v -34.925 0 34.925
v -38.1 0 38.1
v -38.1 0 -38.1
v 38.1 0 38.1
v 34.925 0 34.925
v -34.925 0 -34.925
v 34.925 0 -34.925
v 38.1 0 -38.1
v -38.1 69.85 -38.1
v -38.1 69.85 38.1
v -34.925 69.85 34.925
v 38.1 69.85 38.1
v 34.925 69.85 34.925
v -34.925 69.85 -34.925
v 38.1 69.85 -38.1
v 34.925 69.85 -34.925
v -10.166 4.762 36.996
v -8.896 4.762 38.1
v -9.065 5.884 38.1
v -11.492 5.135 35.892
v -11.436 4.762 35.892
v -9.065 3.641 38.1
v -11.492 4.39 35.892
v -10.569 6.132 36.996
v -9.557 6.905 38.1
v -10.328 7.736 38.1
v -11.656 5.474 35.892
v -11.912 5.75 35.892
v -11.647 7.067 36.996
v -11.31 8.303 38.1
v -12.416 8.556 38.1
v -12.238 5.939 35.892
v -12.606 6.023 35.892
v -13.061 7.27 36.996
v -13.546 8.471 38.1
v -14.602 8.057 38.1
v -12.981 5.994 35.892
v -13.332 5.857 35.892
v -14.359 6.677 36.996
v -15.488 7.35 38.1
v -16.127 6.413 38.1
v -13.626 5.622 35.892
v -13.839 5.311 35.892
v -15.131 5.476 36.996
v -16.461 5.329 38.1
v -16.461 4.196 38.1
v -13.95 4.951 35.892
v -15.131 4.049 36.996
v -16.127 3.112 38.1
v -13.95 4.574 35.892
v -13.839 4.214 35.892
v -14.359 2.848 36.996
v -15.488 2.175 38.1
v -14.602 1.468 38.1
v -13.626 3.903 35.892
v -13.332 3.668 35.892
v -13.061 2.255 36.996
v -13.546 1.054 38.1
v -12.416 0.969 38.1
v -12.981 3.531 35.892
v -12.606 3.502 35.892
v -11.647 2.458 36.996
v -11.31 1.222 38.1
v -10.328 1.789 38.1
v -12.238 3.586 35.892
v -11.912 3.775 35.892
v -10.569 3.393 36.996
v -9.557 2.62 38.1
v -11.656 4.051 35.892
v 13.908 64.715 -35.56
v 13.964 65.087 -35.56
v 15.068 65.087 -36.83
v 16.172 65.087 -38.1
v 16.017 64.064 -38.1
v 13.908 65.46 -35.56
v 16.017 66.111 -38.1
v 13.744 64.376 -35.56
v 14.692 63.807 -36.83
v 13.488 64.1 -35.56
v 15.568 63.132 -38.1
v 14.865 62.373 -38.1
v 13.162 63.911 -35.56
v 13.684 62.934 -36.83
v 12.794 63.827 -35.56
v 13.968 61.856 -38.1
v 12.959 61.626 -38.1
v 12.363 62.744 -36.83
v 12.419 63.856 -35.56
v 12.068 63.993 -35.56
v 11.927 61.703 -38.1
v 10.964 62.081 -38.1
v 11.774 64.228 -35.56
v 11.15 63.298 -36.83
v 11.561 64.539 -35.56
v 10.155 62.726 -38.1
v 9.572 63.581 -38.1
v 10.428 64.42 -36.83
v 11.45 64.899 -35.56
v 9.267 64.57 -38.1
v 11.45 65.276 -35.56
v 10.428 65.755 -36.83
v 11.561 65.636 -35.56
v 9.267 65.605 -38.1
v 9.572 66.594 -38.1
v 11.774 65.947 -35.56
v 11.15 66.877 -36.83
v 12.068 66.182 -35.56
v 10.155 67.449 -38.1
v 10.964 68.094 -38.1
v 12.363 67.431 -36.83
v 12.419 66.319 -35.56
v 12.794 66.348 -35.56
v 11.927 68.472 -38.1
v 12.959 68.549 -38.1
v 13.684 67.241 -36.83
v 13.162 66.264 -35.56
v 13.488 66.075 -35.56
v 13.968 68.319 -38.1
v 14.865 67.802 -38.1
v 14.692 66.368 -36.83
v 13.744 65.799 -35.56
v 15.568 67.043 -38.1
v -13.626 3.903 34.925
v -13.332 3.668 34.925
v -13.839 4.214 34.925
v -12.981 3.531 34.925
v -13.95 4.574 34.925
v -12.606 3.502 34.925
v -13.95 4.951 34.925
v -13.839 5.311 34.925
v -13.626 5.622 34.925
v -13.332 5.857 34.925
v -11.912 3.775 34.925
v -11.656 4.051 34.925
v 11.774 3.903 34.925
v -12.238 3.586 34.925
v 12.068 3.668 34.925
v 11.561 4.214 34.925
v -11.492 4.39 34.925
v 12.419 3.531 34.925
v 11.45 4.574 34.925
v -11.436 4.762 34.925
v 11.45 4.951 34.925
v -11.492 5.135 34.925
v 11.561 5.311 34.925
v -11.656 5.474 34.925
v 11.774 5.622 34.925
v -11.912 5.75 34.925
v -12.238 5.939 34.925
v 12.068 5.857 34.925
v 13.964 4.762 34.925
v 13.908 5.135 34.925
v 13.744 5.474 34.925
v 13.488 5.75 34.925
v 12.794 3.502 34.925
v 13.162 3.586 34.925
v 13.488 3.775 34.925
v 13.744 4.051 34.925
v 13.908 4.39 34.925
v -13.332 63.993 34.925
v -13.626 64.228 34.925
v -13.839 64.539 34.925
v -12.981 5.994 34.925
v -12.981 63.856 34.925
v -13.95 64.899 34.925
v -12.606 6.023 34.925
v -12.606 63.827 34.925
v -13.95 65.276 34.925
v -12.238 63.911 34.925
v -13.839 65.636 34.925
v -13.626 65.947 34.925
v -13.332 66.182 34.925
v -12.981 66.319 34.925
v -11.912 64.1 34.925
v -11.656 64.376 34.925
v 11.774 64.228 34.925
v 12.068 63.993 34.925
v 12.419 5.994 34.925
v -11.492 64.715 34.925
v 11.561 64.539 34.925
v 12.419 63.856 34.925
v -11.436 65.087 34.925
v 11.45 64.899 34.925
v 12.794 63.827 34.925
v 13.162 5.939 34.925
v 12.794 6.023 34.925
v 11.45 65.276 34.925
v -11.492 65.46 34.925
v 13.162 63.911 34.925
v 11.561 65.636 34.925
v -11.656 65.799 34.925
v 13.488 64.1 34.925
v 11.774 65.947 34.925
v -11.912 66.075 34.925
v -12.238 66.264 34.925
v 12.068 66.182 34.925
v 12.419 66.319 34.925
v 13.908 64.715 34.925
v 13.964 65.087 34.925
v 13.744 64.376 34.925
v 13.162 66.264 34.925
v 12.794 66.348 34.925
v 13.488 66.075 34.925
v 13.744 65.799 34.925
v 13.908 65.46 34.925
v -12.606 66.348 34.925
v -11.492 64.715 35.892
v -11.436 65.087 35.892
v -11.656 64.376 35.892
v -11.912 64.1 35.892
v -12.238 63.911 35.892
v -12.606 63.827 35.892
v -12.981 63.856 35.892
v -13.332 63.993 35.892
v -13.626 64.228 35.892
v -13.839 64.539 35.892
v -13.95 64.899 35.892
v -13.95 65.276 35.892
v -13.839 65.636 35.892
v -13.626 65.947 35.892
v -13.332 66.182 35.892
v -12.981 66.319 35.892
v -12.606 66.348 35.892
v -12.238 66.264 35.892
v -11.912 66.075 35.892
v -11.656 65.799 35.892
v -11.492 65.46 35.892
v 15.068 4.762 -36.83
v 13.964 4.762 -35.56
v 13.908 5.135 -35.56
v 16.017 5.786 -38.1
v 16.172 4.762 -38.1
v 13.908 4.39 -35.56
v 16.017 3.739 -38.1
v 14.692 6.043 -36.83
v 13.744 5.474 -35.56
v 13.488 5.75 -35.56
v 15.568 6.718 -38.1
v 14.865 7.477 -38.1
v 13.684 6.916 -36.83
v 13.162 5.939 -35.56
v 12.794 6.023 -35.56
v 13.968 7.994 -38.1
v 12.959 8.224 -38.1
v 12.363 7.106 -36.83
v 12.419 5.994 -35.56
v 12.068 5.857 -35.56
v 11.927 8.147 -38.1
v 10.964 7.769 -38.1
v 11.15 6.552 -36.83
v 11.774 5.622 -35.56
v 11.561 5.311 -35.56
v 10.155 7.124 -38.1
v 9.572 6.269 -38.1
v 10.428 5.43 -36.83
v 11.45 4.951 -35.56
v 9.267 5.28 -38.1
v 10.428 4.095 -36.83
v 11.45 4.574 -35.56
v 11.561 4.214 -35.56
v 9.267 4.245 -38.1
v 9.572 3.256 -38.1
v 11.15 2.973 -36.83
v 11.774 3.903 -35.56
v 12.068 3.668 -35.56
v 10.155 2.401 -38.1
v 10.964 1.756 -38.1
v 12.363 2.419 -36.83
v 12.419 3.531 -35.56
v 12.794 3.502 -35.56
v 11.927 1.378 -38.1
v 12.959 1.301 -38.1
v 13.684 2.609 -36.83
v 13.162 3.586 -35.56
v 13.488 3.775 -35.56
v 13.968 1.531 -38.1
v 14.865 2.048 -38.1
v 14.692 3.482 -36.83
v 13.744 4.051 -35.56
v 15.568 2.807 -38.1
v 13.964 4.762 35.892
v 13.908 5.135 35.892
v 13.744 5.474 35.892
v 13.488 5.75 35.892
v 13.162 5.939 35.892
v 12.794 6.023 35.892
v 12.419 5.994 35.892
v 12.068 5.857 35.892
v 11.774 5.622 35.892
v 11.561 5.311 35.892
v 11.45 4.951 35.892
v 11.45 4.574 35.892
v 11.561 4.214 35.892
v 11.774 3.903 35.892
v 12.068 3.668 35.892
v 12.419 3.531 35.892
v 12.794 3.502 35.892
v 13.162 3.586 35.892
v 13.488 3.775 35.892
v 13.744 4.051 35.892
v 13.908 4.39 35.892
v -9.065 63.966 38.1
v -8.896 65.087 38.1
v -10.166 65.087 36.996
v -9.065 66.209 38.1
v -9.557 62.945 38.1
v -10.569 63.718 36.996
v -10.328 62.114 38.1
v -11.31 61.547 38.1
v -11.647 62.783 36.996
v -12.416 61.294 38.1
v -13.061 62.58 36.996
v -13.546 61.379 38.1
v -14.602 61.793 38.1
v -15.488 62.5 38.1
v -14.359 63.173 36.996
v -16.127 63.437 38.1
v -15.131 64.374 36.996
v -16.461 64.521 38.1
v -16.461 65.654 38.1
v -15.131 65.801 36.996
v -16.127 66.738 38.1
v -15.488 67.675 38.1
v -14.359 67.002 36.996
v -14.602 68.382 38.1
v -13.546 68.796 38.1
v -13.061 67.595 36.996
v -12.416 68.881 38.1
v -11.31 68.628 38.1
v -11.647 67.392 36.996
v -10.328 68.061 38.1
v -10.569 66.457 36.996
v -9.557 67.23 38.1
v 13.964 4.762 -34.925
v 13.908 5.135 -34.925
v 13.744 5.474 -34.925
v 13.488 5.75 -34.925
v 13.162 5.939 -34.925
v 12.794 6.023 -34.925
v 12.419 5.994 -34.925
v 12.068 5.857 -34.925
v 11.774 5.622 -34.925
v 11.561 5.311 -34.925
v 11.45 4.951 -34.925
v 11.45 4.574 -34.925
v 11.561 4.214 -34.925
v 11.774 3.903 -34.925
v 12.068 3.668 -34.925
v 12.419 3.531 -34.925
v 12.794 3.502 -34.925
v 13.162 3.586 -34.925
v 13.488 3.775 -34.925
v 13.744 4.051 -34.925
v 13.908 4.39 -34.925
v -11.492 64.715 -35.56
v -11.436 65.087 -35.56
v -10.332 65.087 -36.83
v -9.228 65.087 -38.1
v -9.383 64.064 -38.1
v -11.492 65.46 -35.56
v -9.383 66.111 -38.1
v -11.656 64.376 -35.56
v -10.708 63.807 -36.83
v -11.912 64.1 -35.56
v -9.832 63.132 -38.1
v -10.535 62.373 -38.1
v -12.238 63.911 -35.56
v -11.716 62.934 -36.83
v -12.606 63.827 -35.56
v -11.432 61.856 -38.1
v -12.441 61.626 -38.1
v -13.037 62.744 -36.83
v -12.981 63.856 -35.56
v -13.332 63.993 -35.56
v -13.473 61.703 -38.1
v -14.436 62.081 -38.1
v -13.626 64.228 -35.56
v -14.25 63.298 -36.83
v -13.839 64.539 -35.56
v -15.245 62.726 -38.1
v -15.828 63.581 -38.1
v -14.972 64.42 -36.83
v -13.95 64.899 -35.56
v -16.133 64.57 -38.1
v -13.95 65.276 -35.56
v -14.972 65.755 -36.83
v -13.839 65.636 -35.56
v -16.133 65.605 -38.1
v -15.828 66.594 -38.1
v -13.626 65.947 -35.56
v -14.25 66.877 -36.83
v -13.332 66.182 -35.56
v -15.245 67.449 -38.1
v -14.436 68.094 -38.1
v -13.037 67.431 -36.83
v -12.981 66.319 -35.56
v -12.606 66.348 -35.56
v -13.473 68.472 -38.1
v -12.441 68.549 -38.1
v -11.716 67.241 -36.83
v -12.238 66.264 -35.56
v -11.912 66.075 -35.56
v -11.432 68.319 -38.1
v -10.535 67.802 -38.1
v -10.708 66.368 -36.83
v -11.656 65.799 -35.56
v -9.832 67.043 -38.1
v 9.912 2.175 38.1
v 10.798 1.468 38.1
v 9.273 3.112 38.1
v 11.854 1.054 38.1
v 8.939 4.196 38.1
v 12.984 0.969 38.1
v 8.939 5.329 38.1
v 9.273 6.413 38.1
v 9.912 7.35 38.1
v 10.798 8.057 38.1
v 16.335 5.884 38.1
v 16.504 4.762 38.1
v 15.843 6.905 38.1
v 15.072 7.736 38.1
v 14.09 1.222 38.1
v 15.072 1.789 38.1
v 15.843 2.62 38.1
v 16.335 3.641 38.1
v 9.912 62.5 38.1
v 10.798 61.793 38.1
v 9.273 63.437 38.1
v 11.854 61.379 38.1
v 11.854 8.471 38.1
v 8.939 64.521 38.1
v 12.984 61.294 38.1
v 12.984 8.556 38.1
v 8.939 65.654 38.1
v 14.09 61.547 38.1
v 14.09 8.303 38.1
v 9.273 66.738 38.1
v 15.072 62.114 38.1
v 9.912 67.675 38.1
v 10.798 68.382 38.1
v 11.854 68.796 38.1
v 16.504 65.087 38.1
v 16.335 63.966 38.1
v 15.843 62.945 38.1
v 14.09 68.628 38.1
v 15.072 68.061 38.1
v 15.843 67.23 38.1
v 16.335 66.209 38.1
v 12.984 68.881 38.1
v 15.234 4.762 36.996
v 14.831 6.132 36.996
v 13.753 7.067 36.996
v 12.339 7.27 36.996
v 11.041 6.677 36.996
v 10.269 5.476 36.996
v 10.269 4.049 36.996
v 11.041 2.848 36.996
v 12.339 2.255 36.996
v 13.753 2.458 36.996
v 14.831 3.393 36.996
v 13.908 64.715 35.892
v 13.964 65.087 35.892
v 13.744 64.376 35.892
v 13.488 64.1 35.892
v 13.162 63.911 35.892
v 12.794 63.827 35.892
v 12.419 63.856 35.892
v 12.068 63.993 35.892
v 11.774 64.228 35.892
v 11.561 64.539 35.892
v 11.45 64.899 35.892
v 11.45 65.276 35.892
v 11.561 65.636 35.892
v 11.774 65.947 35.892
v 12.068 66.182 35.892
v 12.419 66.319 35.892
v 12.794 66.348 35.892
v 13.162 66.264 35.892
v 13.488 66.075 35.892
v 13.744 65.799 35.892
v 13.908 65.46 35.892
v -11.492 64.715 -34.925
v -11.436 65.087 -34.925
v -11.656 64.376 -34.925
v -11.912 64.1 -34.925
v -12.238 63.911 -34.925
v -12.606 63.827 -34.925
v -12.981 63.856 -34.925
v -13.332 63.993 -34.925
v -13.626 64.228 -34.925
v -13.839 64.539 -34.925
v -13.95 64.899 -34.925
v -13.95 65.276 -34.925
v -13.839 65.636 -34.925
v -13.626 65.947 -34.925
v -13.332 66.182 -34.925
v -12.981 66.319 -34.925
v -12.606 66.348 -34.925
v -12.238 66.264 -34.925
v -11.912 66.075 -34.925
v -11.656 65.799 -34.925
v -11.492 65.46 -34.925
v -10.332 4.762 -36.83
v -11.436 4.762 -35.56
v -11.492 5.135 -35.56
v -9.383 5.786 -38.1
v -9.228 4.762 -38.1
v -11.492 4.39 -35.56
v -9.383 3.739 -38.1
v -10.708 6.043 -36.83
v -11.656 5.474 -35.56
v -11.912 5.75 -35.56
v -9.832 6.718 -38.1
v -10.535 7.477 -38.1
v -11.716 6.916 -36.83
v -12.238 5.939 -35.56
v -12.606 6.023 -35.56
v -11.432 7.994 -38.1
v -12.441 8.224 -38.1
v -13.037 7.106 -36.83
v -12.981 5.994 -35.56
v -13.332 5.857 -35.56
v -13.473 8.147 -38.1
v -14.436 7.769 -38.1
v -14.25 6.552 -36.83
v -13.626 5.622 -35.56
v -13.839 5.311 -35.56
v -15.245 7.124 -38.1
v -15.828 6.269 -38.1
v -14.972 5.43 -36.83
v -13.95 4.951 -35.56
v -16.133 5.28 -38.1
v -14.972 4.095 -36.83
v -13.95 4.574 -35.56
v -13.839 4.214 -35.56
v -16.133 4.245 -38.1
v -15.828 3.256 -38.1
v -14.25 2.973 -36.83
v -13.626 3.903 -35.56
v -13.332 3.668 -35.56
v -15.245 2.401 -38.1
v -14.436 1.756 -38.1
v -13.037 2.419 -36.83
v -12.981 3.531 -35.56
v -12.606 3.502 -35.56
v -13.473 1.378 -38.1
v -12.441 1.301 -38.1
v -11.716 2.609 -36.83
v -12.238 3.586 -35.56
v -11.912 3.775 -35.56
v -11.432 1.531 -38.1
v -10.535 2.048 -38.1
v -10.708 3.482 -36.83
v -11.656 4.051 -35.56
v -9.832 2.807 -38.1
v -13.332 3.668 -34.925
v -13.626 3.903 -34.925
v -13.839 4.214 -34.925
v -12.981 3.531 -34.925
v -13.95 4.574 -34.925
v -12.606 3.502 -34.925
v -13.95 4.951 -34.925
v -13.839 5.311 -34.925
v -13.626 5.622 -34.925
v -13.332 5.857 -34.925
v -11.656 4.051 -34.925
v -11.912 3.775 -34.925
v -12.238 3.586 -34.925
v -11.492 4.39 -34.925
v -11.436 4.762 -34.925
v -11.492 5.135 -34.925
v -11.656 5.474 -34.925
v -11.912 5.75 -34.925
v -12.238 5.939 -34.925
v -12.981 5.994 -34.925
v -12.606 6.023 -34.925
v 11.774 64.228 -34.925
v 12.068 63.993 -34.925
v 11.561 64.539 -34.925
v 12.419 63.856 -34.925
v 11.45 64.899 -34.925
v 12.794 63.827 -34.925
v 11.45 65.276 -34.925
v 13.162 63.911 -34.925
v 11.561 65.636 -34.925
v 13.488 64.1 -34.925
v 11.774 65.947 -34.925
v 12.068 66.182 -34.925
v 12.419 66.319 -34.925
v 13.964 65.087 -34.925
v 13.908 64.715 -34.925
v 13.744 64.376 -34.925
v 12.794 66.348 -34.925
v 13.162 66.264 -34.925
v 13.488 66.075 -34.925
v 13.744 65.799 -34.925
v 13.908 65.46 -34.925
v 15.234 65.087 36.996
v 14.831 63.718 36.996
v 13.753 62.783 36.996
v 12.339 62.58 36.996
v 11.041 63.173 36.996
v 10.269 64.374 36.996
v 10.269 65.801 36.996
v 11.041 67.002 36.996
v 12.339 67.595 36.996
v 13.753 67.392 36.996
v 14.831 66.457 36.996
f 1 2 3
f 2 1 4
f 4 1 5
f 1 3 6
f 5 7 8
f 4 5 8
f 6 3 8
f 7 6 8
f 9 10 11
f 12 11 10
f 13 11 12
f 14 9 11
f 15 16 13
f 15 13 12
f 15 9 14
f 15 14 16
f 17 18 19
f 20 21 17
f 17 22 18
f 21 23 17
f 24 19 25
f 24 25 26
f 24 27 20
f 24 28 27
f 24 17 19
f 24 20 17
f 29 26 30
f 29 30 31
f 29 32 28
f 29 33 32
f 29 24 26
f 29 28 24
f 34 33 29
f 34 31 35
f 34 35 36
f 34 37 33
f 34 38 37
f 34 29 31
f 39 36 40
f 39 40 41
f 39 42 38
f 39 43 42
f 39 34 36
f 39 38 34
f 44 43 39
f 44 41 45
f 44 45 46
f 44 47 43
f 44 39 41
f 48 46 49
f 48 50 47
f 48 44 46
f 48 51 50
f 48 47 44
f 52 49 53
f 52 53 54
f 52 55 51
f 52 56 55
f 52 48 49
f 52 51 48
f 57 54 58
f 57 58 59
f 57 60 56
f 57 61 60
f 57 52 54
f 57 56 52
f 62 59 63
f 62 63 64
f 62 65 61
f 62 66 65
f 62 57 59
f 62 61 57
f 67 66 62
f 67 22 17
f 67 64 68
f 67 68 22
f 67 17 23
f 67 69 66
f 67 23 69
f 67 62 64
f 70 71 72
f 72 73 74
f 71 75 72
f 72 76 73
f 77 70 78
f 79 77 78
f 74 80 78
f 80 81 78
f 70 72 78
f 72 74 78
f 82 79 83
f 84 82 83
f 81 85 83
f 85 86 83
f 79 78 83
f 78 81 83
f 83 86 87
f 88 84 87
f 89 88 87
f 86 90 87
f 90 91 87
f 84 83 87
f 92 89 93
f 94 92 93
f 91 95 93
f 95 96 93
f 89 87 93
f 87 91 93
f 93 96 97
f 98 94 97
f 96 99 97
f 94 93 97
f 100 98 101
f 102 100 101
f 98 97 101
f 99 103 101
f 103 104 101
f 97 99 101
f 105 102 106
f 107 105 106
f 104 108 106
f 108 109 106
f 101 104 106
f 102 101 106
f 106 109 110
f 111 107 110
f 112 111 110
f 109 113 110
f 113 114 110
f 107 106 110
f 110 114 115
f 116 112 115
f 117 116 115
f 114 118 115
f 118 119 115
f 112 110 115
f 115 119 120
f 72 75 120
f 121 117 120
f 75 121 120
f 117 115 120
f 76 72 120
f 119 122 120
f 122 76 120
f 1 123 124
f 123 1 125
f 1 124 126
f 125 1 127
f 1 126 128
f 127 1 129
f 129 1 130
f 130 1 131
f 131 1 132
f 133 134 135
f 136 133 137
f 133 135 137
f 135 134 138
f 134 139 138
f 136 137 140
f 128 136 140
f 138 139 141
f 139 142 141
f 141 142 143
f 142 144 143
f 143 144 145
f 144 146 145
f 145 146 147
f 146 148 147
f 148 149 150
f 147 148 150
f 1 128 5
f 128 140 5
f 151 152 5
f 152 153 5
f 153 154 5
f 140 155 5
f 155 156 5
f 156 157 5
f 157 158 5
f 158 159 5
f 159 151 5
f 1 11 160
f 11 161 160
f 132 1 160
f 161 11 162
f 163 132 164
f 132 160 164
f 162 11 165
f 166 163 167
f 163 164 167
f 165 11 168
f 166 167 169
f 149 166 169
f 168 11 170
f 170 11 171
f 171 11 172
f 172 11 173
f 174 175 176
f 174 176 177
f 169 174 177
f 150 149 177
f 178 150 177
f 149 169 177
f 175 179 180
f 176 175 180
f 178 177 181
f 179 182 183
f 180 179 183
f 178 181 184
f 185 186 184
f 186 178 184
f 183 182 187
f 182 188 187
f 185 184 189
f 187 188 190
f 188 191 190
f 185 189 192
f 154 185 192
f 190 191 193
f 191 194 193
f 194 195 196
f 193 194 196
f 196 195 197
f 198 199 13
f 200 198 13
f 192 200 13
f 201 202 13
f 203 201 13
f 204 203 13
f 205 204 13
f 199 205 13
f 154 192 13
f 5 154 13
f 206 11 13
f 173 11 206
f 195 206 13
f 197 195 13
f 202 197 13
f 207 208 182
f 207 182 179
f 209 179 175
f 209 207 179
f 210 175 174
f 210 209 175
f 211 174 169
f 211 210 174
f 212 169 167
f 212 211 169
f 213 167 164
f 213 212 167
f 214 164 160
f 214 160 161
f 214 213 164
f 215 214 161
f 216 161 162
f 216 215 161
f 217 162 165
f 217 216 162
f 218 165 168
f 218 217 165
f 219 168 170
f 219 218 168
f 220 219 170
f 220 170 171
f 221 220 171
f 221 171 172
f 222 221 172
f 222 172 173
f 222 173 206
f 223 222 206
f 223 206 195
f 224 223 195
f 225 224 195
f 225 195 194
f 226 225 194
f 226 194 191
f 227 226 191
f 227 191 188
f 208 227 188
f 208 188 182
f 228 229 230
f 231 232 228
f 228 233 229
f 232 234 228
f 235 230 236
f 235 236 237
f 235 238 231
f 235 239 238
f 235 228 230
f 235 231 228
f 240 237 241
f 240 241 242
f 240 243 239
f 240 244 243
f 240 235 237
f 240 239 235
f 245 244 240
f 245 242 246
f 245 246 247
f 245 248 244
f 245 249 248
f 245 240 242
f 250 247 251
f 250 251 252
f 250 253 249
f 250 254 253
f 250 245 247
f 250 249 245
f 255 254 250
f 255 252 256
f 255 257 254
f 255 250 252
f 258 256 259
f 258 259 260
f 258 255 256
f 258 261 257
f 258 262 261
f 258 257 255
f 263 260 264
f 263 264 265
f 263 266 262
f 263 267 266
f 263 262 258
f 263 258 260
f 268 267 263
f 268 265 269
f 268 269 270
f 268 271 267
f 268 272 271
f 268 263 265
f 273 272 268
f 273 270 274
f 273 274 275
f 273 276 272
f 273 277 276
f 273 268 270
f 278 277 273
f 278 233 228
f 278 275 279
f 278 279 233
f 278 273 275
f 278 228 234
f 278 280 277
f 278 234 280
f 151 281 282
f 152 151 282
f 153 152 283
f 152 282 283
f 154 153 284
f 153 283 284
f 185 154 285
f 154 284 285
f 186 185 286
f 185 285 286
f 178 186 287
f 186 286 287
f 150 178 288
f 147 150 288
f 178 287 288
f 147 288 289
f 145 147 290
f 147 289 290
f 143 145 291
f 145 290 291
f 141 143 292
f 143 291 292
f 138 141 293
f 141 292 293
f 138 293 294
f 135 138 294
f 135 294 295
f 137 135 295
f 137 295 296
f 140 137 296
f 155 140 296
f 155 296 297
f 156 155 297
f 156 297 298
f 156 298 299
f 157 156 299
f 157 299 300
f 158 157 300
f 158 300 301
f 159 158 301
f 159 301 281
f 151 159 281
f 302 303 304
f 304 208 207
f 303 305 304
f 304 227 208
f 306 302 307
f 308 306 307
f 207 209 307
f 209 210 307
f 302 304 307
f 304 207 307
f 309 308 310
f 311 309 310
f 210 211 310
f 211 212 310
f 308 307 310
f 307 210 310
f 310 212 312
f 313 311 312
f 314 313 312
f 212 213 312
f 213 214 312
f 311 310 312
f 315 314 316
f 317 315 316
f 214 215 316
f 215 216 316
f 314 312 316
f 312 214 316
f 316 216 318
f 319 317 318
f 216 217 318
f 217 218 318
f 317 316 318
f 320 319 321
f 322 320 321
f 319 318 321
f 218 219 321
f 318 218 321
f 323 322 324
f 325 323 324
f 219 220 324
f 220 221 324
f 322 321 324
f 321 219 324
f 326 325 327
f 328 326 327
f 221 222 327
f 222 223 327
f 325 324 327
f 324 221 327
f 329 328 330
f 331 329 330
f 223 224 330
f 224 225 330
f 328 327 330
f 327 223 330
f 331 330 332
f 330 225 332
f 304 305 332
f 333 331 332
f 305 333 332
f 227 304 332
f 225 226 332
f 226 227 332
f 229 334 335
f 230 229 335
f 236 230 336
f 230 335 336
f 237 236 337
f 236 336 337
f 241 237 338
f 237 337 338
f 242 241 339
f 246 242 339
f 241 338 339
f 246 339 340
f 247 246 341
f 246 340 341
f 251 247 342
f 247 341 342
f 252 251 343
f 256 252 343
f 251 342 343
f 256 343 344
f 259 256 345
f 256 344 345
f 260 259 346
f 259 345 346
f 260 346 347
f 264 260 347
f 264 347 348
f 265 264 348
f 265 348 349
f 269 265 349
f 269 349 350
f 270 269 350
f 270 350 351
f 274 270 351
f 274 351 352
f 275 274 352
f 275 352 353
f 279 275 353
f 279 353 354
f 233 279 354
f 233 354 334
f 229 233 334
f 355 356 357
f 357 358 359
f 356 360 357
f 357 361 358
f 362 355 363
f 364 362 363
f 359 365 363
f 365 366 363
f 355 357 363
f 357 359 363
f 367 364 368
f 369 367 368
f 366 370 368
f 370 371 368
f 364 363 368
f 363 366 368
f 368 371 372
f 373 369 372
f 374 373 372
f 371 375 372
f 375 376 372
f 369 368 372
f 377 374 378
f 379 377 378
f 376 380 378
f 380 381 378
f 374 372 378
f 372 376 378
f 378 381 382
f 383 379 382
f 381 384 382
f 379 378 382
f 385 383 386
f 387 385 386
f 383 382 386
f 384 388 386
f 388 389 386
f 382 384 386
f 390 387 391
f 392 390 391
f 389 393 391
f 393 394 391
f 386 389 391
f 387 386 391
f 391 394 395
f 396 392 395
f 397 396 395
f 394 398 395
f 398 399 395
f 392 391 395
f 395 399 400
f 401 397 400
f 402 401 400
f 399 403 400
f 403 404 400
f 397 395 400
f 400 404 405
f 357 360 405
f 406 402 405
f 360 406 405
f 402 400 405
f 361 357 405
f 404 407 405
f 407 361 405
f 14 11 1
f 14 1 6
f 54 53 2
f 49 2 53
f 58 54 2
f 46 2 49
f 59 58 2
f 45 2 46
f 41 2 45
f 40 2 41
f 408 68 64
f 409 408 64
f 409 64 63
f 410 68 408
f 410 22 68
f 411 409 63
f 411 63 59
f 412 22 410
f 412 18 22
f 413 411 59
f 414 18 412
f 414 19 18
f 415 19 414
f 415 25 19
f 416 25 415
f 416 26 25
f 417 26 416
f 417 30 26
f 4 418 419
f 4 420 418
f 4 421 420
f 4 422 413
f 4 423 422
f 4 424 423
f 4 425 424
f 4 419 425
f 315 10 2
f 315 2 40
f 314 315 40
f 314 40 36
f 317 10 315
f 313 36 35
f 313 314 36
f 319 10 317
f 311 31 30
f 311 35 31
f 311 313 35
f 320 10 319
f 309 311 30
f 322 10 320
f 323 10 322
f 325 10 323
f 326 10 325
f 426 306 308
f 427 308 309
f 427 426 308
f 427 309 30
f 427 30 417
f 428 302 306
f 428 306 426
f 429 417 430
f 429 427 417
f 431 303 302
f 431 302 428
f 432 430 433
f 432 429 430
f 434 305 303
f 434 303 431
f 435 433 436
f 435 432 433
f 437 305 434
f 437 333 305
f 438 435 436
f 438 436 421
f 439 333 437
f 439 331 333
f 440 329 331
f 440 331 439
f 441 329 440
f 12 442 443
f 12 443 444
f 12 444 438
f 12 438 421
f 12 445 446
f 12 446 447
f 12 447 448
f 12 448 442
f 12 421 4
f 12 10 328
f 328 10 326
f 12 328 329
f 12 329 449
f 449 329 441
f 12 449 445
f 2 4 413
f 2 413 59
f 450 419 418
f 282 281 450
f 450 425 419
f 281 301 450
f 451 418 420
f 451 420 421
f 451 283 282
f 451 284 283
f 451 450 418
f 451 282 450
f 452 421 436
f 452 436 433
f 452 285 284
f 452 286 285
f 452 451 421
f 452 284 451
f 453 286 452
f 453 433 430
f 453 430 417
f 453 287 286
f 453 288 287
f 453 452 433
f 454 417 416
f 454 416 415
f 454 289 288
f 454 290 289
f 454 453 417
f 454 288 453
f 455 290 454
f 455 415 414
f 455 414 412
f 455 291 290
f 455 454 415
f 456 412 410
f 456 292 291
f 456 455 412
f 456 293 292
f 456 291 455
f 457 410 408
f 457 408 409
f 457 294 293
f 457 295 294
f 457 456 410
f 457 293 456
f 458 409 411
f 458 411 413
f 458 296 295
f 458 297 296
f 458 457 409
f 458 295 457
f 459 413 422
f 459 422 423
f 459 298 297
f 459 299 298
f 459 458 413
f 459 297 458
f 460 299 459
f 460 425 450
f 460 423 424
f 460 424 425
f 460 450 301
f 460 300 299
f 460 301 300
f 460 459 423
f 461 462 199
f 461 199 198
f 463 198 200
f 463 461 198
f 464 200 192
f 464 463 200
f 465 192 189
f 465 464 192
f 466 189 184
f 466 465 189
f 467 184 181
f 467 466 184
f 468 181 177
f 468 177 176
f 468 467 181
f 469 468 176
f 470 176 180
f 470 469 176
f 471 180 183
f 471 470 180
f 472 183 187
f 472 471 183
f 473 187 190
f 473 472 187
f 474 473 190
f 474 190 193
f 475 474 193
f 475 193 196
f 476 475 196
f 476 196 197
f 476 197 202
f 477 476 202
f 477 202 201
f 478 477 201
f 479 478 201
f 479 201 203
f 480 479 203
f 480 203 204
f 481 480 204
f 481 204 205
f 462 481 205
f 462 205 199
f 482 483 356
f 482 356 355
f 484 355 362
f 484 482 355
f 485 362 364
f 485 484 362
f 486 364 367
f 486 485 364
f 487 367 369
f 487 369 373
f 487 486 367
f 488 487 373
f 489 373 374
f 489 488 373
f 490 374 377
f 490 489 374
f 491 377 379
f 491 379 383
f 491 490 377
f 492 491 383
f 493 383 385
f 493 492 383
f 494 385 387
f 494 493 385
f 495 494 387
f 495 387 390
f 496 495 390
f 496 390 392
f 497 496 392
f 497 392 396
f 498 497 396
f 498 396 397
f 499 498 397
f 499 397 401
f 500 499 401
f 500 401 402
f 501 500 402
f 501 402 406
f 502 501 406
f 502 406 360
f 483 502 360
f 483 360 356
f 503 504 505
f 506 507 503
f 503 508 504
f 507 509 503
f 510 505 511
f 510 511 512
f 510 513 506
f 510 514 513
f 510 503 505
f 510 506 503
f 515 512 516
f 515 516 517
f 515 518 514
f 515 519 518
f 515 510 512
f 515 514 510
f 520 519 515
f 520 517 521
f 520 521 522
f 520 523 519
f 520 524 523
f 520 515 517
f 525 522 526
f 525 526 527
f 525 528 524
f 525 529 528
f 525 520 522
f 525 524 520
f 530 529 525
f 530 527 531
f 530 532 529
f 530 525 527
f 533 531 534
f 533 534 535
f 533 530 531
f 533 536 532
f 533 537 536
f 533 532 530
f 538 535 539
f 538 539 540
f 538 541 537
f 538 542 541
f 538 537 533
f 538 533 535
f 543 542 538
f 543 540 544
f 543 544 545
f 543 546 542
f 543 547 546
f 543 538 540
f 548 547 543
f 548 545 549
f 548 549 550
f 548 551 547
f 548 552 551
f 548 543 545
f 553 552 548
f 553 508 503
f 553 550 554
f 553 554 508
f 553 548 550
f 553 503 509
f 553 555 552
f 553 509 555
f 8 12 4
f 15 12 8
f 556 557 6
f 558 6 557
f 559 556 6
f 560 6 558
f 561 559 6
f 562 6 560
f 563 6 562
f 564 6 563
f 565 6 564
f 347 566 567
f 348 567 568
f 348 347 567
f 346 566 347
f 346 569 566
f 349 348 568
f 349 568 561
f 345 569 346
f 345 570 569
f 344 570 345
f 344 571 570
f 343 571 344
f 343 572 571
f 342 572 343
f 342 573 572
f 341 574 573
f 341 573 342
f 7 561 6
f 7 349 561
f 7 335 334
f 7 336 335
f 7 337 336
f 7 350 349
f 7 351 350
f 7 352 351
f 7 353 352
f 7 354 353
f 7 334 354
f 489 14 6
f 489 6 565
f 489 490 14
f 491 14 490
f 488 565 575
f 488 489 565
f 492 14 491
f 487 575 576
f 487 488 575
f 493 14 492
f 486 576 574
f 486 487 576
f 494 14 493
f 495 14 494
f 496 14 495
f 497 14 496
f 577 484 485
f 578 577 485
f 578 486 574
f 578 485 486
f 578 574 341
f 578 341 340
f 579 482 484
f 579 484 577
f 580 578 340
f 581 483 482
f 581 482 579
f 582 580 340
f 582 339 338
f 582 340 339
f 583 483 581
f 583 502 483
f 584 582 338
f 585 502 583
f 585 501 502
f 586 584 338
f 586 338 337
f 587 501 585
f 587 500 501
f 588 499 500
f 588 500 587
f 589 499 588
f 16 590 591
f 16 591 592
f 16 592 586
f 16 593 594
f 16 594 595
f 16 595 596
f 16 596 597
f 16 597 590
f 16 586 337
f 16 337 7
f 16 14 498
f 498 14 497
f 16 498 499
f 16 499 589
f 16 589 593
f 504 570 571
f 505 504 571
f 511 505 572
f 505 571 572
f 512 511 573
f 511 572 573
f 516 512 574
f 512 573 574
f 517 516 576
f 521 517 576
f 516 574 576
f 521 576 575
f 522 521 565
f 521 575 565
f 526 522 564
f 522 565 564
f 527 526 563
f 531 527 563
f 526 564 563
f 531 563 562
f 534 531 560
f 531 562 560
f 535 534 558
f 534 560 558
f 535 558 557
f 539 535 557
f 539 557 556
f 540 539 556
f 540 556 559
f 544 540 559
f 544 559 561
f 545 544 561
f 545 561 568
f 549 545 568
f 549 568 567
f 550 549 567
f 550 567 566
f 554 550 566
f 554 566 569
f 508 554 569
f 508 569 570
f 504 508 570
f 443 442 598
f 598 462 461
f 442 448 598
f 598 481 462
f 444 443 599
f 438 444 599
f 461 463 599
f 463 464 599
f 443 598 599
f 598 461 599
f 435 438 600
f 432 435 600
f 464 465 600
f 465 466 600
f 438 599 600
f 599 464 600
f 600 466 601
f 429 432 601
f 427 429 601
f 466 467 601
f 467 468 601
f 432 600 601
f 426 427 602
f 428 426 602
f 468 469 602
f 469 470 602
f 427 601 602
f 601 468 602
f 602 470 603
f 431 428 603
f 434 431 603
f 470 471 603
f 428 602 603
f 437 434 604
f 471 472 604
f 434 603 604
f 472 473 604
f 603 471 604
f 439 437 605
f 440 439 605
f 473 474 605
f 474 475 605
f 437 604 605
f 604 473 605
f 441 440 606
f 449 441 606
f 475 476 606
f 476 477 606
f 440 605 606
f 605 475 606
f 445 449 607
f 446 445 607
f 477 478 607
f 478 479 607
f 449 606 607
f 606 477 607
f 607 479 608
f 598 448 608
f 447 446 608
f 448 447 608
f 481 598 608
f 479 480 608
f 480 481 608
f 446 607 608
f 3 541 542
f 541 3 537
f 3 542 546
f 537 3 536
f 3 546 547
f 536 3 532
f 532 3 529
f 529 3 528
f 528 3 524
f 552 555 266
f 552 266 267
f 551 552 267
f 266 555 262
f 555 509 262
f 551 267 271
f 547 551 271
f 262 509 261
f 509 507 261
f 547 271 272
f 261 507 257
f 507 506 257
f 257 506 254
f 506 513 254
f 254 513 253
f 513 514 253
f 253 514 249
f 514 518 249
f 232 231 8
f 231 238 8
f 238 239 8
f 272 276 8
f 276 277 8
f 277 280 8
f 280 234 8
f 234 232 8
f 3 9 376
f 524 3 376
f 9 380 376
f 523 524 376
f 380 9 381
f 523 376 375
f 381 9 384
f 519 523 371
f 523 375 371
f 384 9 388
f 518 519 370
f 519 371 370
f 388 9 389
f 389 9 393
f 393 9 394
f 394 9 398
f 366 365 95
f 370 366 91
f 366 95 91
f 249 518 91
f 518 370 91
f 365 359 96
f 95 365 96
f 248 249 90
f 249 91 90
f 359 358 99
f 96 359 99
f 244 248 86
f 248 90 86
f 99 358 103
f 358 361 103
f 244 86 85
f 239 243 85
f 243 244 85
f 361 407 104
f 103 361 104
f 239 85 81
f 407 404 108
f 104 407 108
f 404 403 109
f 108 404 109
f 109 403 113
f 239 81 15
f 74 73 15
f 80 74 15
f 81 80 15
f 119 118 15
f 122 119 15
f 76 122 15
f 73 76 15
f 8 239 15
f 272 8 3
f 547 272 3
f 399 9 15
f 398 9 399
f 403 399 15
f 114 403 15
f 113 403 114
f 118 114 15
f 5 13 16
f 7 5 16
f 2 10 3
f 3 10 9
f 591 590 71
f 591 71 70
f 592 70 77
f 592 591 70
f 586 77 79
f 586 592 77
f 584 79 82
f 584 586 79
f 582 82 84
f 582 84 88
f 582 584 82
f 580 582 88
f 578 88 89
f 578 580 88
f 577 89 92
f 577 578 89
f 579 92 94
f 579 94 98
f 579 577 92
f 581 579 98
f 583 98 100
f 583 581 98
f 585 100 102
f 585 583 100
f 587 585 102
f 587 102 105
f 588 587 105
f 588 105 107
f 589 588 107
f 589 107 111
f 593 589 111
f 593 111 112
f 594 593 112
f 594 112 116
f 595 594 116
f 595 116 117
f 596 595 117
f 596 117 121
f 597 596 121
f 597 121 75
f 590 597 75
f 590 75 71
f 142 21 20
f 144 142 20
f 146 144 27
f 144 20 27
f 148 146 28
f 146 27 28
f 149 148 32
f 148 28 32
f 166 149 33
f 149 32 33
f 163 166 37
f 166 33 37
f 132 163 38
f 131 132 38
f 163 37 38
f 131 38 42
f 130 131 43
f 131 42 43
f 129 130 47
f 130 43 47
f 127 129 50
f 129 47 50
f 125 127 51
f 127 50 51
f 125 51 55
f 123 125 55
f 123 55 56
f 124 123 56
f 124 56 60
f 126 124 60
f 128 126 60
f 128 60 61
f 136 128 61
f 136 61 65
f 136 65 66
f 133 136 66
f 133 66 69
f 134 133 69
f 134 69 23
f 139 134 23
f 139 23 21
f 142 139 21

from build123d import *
from OCP.BRepFilletAPI import BRepFilletAPI_MakeChamfer

# Parameters (mm, degrees)
SKETCH1_W           = 76.2
SKETCH1_H           = 76.2
SKETCH1_W_2         = 69.85
SKETCH1_H_2         = 69.85
BOSS_EXTRUDE1_DEPTH = 9.525
SKETCH2_R           = 1.26365
CUT_EXTRUDE1_DEPTH  = 86.725
CHAMFER1_SIZE       = 2.54
CHAMFER1_SIZE2      = 2.207988314
SKETCH3_W           = 76.2
SKETCH3_H           = 76.2
SKETCH3_W_2         = 69.85
SKETCH3_H_2         = 69.85
BOSS_EXTRUDE2_DEPTH = 25.4


with BuildPart() as part:
    # Sketch1 → Boss-Extrude1 (new body)
    with BuildSketch(Plane(origin=(0, 0, 0), x_dir=(1, 0, 0), z_dir=(0, 1, 0))):
        Rectangle(SKETCH1_W, SKETCH1_H)
        Rectangle(SKETCH1_W_2, SKETCH1_H_2, mode=Mode.SUBTRACT)
    extrude(amount=BOSS_EXTRUDE1_DEPTH)

    # Sketch2 → Cut-Extrude1 (cut, through all)
    with BuildSketch(Plane.XY.offset(38.1)):
        with Locations((-12.7, 4.7625)):
            Circle(SKETCH2_R)
        with Locations((12.7, 4.7625)):
            Circle(SKETCH2_R)
    extrude(amount=-CUT_EXTRUDE1_DEPTH, mode=Mode.SUBTRACT)

    # Chamfer1: one chamfer whose edges measure the first distance from different faces: ONE call of the kernel's chamfer builder (chamfer() names one face for all edges)
    chamfer1_edges_1 = [part.edges().sort_by_distance(p)[0] for p in [
        (-13.96365, 4.7625, -38.1),
    ]]
    chamfer1_side_1 = [part.faces().sort_by_distance(p)[0] for p in [
        (-13.96365, 4.7625, -36.5125),
    ]]
    chamfer1_edges_2 = [part.edges().sort_by_distance(p)[0] for p in [
        (-13.96365, 4.7625, 38.1),
        (11.43635, 4.7625, 38.1),
    ]]
    chamfer1_side_2 = [part.faces().sort_by_distance(p)[0] for p in [
        (0, 4.7625, 38.1),
    ]]
    chamfer1_edges_3 = [part.edges().sort_by_distance(p)[0] for p in [
        (11.43635, 4.7625, -38.1),
    ]]
    chamfer1_side_3 = [part.faces().sort_by_distance(p)[0] for p in [
        (11.43635, 4.7625, -36.5125),
    ]]
    chamfer1 = BRepFilletAPI_MakeChamfer(part.part.solid().wrapped)
    for e in chamfer1_edges_1:
        chamfer1.Add(CHAMFER1_SIZE, CHAMFER1_SIZE2, e.wrapped, chamfer1_side_1[0].wrapped)  # the first distance lies on this face
    for e in chamfer1_edges_2:
        chamfer1.Add(CHAMFER1_SIZE, CHAMFER1_SIZE2, e.wrapped, chamfer1_side_2[0].wrapped)  # the first distance lies on this face
    for e in chamfer1_edges_3:
        chamfer1.Add(CHAMFER1_SIZE, CHAMFER1_SIZE2, e.wrapped, chamfer1_side_3[0].wrapped)  # the first distance lies on this face
    add(Compound.cast(chamfer1.Shape()), mode=Mode.REPLACE)

    # Sketch3 → Boss-Extrude2 (add)
    with BuildSketch(Plane(origin=(0, 9.525, 0), x_dir=(1, 0, 0), z_dir=(0, 1, 0))):
        Rectangle(SKETCH3_W, SKETCH3_H)
        Rectangle(SKETCH3_W_2, SKETCH3_H_2, mode=Mode.SUBTRACT)
    extrude(amount=BOSS_EXTRUDE2_DEPTH)

    # Mirror2: part across plane


with BuildPart() as part_1:
    add(part.part)
    add(part.part.mirror(Plane.ZX.offset(34.925)))


solid = part_1.part
